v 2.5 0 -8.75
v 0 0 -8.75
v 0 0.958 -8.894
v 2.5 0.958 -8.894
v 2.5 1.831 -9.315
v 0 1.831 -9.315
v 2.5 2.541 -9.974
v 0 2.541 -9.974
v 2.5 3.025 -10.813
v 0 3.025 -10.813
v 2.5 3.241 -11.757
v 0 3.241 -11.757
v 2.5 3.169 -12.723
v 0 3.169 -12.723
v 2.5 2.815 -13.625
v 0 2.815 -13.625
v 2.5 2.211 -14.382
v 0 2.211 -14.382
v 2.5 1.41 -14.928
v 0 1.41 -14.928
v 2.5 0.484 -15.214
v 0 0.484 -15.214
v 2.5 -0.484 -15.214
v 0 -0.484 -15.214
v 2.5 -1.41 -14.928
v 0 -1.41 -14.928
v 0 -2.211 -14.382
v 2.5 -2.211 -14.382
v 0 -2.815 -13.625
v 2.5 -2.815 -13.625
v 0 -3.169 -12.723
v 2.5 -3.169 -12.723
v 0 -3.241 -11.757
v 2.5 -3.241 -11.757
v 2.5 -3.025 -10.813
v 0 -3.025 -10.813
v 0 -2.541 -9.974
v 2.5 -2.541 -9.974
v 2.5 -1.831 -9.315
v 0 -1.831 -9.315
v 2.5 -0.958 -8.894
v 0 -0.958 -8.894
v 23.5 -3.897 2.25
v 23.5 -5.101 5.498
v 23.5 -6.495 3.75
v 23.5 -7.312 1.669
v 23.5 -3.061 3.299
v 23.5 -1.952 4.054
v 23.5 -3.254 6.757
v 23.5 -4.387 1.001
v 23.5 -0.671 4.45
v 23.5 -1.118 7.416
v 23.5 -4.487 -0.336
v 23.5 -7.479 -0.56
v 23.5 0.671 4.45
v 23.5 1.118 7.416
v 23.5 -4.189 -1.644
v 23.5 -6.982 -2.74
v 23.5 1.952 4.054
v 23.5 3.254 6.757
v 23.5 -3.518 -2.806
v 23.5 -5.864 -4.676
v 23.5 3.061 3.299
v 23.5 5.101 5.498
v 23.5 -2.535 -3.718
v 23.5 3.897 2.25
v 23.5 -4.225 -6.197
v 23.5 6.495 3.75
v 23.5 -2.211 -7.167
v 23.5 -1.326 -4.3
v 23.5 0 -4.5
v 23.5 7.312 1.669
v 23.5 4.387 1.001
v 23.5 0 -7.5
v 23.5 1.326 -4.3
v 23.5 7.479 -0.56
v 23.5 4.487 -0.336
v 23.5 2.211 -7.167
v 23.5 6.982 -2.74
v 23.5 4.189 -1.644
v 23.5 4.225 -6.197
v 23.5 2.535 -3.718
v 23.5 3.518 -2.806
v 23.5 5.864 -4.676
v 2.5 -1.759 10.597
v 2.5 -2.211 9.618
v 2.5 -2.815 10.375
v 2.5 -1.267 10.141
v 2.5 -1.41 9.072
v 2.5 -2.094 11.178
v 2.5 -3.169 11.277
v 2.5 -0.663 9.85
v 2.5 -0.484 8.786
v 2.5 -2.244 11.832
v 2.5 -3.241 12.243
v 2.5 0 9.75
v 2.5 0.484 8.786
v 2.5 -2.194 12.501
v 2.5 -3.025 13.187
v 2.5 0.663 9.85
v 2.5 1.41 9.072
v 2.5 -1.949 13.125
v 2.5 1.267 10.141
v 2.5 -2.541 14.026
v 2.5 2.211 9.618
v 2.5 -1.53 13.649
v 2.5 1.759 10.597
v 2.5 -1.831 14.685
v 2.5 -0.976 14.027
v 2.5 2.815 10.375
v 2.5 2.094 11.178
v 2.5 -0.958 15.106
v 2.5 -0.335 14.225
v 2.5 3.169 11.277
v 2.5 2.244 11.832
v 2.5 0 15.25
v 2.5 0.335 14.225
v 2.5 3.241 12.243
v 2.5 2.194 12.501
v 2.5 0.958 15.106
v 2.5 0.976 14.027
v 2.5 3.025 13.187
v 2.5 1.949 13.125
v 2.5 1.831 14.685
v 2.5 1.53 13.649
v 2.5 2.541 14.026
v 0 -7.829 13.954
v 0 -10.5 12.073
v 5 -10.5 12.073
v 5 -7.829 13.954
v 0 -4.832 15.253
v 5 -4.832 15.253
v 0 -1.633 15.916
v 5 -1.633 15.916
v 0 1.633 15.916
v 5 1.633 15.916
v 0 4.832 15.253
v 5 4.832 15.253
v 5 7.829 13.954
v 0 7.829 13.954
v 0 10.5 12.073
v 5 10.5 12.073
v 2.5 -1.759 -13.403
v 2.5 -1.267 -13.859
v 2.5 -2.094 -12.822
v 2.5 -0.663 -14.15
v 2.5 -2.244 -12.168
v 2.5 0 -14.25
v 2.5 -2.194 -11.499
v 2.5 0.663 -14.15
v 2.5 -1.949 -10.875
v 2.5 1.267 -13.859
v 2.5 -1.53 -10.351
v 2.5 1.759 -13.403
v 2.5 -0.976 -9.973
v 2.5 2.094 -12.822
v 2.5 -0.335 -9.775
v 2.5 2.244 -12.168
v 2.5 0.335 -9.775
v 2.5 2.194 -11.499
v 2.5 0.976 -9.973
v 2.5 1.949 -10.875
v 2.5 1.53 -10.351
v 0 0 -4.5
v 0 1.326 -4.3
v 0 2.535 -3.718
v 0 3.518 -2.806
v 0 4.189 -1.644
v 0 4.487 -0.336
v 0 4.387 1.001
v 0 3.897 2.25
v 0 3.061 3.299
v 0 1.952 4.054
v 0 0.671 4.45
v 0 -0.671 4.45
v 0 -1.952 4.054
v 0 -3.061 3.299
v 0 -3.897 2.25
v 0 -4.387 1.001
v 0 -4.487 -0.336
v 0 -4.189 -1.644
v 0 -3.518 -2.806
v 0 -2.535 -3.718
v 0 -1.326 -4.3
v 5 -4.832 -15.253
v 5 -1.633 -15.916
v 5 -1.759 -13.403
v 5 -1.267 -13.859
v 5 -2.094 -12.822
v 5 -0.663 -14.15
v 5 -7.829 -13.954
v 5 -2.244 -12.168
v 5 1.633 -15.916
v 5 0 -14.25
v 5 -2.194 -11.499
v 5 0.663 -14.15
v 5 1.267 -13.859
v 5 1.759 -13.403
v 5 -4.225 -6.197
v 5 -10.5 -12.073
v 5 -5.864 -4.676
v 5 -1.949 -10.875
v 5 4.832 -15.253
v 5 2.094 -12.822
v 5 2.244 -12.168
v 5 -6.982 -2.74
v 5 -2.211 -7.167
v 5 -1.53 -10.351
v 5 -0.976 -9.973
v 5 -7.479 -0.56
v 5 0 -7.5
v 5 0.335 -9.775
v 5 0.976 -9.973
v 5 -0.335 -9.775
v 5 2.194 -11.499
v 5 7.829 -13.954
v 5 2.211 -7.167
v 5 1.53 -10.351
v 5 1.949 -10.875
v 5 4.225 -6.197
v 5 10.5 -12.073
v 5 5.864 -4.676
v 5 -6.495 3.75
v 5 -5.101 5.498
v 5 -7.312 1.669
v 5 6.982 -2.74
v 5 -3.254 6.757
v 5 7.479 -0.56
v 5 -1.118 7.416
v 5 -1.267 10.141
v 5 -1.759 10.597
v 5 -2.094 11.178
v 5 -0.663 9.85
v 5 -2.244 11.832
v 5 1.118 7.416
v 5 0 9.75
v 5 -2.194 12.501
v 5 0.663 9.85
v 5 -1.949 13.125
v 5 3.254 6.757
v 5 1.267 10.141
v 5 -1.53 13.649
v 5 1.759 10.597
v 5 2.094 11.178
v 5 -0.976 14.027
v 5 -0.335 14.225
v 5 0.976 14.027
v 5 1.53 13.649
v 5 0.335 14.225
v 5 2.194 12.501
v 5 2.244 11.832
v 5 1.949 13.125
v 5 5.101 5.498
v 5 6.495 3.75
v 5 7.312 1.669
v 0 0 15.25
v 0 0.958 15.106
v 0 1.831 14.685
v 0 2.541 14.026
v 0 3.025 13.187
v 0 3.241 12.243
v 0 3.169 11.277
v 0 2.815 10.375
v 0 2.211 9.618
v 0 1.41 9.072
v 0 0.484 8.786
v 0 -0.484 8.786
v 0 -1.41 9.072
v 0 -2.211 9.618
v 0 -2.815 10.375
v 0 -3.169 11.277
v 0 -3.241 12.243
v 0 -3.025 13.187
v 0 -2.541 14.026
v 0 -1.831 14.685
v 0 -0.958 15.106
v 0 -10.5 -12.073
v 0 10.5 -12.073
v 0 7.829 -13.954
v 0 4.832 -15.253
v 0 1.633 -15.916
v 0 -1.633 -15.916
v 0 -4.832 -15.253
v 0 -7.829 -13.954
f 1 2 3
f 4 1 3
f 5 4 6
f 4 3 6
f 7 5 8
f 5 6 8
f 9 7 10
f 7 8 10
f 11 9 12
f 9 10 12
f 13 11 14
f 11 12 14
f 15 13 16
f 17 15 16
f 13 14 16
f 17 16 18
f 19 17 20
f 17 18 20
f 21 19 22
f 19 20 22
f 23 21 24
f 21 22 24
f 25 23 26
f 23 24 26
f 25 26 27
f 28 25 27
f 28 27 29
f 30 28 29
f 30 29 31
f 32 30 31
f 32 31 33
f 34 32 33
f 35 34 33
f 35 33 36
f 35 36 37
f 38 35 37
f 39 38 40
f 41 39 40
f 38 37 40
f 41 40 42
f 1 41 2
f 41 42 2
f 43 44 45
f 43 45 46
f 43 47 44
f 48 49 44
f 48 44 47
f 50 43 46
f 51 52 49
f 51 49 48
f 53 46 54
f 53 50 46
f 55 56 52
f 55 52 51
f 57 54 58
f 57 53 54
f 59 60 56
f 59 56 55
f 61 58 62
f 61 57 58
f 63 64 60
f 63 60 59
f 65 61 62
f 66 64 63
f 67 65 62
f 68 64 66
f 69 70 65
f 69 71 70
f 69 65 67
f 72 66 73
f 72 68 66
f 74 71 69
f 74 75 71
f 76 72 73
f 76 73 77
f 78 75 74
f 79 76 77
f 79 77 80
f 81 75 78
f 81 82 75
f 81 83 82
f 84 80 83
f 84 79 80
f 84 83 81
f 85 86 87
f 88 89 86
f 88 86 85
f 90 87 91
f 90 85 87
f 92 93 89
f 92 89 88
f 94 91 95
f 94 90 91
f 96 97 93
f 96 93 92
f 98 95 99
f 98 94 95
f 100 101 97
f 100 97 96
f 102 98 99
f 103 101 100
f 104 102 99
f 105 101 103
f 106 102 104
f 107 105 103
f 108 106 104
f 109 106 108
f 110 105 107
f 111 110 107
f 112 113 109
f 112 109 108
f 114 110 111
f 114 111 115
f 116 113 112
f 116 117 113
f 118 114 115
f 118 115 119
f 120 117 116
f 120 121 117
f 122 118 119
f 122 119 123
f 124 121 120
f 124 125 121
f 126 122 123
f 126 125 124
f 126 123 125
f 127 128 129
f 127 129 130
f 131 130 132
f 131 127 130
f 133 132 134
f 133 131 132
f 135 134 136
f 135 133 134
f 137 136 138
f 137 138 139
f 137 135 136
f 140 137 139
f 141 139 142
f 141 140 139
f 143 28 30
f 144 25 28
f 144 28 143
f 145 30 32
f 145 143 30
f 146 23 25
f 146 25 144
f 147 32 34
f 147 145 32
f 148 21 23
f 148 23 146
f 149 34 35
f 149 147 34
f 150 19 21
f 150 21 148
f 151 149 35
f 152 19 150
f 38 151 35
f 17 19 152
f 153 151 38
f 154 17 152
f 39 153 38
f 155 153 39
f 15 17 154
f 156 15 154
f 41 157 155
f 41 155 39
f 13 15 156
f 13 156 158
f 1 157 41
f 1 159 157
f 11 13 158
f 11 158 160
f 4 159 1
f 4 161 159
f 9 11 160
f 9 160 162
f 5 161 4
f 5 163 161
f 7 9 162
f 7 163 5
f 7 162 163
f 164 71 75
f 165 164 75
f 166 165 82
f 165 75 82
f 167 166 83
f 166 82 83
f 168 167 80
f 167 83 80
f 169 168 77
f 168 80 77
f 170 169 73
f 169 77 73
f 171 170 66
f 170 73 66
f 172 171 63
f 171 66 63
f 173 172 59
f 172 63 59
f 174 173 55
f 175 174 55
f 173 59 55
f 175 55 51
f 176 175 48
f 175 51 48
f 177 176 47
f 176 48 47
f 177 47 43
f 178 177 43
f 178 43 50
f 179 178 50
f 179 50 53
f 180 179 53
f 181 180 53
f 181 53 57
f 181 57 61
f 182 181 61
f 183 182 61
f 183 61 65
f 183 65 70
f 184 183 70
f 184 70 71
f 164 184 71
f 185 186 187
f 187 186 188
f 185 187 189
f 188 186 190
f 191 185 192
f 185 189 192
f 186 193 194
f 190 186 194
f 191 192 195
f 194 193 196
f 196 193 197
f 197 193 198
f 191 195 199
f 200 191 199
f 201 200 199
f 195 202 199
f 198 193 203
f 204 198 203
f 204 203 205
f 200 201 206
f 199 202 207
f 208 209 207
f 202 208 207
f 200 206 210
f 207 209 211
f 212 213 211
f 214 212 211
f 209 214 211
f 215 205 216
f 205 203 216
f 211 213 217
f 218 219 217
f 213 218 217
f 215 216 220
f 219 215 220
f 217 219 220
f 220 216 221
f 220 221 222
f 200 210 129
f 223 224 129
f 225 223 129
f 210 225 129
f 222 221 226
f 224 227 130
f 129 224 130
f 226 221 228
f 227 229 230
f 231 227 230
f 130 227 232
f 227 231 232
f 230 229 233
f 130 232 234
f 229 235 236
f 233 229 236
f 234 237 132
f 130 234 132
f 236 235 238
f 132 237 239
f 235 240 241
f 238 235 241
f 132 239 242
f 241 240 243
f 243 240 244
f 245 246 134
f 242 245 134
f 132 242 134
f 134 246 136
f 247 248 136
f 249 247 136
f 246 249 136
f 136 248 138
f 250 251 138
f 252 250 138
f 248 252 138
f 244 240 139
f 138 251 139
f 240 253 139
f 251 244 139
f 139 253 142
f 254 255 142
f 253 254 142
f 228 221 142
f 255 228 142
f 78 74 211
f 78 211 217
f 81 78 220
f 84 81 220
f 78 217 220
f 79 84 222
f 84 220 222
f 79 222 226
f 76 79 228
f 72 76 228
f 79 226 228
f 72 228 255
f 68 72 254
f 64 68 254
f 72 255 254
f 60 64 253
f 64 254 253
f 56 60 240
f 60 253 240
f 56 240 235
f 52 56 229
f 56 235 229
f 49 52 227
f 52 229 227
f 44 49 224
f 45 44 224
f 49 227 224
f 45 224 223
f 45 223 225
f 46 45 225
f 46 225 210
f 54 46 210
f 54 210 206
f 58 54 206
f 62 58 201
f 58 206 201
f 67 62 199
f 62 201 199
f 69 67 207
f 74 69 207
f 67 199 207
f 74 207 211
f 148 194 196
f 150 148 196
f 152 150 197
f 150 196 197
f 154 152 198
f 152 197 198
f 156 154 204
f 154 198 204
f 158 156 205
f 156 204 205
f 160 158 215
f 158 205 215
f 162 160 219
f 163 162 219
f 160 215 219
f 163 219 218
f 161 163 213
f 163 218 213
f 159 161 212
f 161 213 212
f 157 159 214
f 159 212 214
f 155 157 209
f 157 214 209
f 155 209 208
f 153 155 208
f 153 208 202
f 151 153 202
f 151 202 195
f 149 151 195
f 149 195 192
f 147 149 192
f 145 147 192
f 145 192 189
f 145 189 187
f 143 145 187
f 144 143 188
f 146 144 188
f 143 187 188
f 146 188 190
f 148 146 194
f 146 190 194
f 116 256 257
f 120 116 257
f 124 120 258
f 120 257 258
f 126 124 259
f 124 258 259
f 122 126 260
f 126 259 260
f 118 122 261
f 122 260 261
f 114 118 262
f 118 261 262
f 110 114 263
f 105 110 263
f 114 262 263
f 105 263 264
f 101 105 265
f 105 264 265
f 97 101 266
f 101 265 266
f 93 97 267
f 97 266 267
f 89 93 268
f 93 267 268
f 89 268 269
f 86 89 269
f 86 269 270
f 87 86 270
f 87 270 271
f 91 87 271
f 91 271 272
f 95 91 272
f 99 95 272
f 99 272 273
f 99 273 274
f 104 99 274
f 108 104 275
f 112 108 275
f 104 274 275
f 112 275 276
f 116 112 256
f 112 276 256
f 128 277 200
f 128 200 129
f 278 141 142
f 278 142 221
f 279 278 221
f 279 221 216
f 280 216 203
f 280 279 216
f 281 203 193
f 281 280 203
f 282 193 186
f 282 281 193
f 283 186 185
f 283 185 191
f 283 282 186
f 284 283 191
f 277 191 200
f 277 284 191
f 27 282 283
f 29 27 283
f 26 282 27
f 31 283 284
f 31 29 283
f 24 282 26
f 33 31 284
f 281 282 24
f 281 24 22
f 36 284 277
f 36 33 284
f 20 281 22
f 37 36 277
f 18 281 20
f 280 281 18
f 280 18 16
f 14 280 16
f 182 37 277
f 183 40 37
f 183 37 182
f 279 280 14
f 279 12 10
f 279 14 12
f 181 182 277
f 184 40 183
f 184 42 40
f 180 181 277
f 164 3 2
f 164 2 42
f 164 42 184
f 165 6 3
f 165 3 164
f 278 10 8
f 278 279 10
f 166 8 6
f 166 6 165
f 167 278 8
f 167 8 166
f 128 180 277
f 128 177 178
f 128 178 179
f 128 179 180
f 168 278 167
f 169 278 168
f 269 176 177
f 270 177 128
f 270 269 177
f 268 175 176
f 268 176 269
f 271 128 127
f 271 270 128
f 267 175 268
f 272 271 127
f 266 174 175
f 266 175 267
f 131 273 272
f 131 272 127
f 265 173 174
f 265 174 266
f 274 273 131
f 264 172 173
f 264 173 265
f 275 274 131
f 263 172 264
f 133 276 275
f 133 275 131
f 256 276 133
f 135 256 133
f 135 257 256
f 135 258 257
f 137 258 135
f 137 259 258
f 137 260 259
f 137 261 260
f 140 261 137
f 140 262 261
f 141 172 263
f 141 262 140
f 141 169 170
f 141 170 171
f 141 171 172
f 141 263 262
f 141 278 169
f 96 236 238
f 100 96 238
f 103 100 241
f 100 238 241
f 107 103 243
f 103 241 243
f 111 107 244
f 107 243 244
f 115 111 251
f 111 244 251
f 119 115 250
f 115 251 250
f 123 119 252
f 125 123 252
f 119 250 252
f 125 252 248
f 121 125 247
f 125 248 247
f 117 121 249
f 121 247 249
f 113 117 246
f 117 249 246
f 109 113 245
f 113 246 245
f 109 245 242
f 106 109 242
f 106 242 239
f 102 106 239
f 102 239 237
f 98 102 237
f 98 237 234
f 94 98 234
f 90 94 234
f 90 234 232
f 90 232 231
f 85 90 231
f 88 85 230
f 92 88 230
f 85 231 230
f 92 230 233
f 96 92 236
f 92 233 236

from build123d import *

# Parameters (mm, degrees)
EXTRUDE_3_DEPTH     = 5
SKETCH_3_R          = 2.25
CUT_EXTRUDE_4_DEPTH = 2.5
SKETCH_5_R          = 7.5
EXTRUDE_4_DEPTH     = 18.5
SKETCH_6_R          = 4.5
CUT_EXTRUDE_5_DEPTH = 24.5
SKETCH_7_R          = 3.25
CUT_EXTRUDE_6_DEPTH = 2.5


with BuildPart() as part:
    # 草图1 → 凸台-拉伸3 (new body)
    with BuildSketch(Plane(origin=(0, 0, 0), x_dir=(0, 0, -1), z_dir=(1, 0, 0))):
        with BuildLine():
            Line((-12.072696468, 10.5), (12.072696468, 10.5))
            ThreePointArc((12.072696468, 10.5), (16, 0), (12.072696468, -10.5))
            Line((12.072696468, -10.5), (-12.072696468, -10.5))
            ThreePointArc((-12.072696468, -10.5), (-16, 0), (-12.072696468, 10.5))
        make_face()
    extrude(amount=EXTRUDE_3_DEPTH)

    # 草图3 → 切除-拉伸4 (cut)
    with BuildSketch(Plane(origin=(5, 0, 0), x_dir=(0, 0, -1), z_dir=(1, 0, 0))):
        with Locations((-12, 0)):
            Circle(SKETCH_3_R)
        with Locations((12, 0)):
            Circle(SKETCH_3_R)
    extrude(amount=-CUT_EXTRUDE_4_DEPTH, mode=Mode.SUBTRACT)

    # 草图5 → 凸台-拉伸4 (add)
    with BuildSketch(Plane(origin=(5, 0, 0), x_dir=(0, 0, -1), z_dir=(1, 0, 0))):
        Circle(SKETCH_5_R)
    extrude(amount=EXTRUDE_4_DEPTH)

    # 草图6 → 切除-拉伸5 (cut, through all)
    with BuildSketch(Plane(origin=(23.5, 0, 0), x_dir=(0, 0, -1), z_dir=(1, 0, 0))):
        Circle(SKETCH_6_R)
    extrude(amount=-CUT_EXTRUDE_5_DEPTH, mode=Mode.SUBTRACT)

    # 草图7 → 切除-拉伸6 (cut)
    with BuildSketch(Plane.ZY):
        with Locations((-12, 0)):
            Circle(SKETCH_7_R)
        with Locations((12, 0)):
            Circle(SKETCH_7_R)
    extrude(amount=-CUT_EXTRUDE_6_DEPTH, mode=Mode.SUBTRACT)


solid = part.part
